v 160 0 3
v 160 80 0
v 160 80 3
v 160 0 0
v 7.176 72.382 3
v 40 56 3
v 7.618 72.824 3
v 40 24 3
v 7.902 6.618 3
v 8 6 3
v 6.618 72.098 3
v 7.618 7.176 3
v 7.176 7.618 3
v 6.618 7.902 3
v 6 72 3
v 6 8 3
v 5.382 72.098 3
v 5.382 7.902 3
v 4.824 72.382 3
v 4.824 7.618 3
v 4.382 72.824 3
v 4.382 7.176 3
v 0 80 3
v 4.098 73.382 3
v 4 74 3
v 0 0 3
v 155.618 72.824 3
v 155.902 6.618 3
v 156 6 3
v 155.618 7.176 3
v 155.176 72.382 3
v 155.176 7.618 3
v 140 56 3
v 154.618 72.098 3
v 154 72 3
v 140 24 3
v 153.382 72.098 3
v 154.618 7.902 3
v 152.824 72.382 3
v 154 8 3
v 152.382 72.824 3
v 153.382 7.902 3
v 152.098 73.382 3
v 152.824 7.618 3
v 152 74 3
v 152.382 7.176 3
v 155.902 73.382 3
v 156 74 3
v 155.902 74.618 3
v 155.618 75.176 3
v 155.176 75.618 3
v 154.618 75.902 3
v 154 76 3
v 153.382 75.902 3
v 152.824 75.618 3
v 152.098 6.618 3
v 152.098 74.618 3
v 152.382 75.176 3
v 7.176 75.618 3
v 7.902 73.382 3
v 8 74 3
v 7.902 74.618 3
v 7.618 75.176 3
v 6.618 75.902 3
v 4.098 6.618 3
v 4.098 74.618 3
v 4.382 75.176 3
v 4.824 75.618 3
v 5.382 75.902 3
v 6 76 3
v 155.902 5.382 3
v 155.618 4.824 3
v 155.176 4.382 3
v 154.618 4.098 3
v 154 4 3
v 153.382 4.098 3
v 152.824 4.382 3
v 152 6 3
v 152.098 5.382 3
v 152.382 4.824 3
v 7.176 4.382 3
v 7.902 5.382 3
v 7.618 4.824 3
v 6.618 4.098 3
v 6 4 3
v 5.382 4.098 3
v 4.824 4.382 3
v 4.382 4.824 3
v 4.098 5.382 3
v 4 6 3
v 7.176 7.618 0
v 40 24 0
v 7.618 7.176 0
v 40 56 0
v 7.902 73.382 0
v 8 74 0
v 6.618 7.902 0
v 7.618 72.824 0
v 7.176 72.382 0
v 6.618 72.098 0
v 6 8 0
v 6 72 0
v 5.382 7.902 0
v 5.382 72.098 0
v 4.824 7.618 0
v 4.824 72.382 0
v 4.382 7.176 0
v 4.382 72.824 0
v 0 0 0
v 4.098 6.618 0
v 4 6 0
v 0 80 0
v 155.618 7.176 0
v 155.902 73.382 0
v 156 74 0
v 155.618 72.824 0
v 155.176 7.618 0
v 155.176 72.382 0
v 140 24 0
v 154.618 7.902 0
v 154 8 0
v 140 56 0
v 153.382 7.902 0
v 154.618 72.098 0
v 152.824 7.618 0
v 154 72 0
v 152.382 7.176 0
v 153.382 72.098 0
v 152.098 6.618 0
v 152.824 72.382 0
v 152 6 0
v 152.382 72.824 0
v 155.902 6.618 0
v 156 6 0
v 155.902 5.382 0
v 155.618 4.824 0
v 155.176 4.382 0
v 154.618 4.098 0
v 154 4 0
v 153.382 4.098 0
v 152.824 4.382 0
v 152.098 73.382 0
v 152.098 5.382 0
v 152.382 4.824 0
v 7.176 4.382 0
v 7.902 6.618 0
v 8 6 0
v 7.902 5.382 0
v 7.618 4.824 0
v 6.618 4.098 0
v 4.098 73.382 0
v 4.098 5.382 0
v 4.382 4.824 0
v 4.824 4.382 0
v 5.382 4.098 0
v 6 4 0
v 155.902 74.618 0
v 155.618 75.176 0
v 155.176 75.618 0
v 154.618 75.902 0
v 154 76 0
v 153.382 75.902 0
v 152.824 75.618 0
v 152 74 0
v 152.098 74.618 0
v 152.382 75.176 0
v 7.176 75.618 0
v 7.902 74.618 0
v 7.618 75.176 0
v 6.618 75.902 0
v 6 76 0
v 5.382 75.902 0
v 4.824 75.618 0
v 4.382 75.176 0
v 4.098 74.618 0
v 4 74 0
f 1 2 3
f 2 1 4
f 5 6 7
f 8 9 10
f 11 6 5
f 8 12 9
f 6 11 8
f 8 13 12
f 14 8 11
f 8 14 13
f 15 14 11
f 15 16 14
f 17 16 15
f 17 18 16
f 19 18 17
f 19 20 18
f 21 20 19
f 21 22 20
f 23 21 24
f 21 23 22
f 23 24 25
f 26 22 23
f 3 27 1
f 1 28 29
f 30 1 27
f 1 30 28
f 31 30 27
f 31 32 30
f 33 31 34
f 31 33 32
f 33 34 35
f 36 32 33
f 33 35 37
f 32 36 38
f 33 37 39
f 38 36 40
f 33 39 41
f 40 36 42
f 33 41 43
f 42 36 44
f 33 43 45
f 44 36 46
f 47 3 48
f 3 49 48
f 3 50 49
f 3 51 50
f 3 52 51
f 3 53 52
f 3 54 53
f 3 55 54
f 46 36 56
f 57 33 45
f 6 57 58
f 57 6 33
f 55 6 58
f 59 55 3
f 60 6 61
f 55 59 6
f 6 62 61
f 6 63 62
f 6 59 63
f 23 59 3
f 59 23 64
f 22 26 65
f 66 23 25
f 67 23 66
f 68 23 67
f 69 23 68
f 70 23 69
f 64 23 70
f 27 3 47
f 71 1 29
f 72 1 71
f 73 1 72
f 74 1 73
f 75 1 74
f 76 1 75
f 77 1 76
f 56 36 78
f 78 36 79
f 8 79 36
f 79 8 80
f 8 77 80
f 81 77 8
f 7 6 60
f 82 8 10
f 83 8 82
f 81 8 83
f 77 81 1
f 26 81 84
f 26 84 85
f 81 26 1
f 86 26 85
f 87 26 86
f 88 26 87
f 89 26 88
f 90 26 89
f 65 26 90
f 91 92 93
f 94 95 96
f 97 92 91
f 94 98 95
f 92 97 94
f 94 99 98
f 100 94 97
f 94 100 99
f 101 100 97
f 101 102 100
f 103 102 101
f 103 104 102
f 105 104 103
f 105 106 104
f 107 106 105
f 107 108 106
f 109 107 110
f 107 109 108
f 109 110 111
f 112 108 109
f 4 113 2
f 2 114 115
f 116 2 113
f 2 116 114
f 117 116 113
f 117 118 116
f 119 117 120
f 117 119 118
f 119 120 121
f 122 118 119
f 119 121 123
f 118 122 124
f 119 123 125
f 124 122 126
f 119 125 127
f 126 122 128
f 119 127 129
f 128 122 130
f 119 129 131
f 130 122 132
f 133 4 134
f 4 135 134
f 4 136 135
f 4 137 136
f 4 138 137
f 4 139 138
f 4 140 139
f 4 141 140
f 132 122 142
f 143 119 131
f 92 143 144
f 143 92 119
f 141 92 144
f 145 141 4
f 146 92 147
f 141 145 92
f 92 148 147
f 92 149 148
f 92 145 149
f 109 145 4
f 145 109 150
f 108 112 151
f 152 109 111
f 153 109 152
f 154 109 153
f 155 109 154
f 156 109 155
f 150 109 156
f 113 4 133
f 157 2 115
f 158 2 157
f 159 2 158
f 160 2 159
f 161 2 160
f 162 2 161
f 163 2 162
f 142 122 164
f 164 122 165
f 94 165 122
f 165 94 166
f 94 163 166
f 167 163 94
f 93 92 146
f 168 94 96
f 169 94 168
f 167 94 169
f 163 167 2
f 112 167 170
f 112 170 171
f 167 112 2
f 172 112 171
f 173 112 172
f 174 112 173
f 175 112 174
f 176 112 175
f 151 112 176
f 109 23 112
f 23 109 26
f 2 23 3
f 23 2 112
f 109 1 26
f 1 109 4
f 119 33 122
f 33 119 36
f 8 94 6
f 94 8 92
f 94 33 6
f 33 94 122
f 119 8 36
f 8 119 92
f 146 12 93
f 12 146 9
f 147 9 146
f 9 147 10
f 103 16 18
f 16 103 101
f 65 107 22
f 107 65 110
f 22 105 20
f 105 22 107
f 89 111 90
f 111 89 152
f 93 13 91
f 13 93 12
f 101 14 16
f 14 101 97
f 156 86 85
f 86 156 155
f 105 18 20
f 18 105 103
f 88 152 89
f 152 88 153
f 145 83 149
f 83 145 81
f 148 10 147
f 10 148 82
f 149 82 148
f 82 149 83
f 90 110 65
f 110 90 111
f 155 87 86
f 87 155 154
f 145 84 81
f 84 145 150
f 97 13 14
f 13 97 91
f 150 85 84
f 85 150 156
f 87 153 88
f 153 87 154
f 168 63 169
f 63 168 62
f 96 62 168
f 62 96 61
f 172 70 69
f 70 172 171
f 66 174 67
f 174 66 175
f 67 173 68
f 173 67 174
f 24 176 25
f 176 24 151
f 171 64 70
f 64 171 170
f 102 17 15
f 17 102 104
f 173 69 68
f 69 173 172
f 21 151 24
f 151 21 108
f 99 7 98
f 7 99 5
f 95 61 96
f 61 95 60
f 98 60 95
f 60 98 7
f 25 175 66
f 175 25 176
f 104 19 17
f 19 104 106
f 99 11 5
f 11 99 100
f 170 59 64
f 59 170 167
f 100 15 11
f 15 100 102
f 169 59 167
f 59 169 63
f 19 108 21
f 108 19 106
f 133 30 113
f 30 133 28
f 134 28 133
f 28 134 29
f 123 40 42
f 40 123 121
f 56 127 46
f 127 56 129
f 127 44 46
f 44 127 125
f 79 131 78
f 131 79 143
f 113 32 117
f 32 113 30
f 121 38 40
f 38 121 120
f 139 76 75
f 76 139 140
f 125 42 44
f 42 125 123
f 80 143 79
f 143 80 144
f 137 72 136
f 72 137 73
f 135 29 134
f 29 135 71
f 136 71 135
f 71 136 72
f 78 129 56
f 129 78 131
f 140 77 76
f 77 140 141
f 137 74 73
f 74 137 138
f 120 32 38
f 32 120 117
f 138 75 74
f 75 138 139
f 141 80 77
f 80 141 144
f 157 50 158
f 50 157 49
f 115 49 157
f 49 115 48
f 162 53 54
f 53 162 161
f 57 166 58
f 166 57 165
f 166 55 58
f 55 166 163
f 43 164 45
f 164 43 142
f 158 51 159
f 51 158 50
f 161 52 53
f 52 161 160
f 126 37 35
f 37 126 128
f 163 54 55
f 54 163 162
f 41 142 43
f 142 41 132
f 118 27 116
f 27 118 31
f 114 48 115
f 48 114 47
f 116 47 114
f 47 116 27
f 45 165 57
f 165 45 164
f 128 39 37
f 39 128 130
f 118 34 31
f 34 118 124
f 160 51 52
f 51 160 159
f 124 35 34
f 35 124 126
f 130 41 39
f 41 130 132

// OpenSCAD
difference() {
    cube([160, 80, 3]);
    translate([40, 24, -1])
    cube([100, 32, 5]);
    translate([6,6,-1])
    cylinder(d1=4,d2=4,h=5, $fn=20);    
    translate([6,74,-1])
    cylinder(d1=4,d2=4,h=5, $fn=20);    
    translate([154,6,-1])
    cylinder(d1=4,d2=4,h=5, $fn=20);    
    translate([154,74,-1])
    cylinder(d1=4,d2=4,h=5, $fn=20);    
} 

/*
polyhedron(
points=[
    [0,-20,90],[0,100,90],[160,100,90],[160,-20,90], //outer
    [3,-17,90],[3,97,90],[157,97,90],[157,-17,90], //inner
    [40,24,0],[40,56,0],[140,56,0],[140,24,0], // inner
    [37,21,0],[37,59,0],[143,59,0],[143,21,0] // inner
],
faces=[
    [1,0,12,13],[0,3,15,12],[3,2,14,15],[2,1,13,14],
    [4,7,11,8],[5,4,8,9],[7,6,10,11],[6,5,9,10],
    [1,2,6,5],[2,3,7,6],[3,0,4,7],[0,1,5,4],
    [12,15,11,8],[13,12,8,9],[14,13,9,10],[15,14,10,11]
]);

*/
